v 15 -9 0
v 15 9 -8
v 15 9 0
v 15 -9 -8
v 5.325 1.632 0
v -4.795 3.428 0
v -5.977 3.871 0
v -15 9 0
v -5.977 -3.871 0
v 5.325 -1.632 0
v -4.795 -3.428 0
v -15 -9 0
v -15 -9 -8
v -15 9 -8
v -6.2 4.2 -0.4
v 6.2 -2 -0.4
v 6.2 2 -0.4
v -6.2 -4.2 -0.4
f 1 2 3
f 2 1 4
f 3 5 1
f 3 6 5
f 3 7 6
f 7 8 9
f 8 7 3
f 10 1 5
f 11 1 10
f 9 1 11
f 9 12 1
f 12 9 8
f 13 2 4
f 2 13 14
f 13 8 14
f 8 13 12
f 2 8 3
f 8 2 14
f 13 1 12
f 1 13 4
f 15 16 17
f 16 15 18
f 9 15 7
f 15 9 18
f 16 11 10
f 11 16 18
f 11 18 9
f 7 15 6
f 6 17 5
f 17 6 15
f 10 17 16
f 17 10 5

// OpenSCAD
// file: faceted_ridge_key.scad
// Faceted ridge key — asymmetric male/female alignment feature, flat facets only.
//
// 6 vertices, 7 faces, one closed manifold. Euler check: V - E + F = 6 - 11 + 7 = 2.
// No spheres, no cylinders, no splines, no fillets.
//
// THE FLANKS ARE TRIANGULATED EXPLICITLY, and that is not cosmetic. Written as quads
// [0,3,5,4] and [1,4,5,2] they are NOT planar — the base edge and the ridge edge are
// skew, so the four corners do not share a plane. A checker caught this after the first
// draft claimed the opposite. Left as quads, the tessellator picks the fold direction for
// you, which means the "flat facet" promise is broken by an unspecified crease and two
// exporters can disagree about the shape. Splitting them here fixes the crease at
// back-bottom -> front-ridge, which keeps the rear peak's triangle large and clean.
//
// FRAME CONVENTION (matches the CAD mate connector it is derived from):
//   +Z  the mating axis   — the feature protrudes along it
//   +X  the roll reference — the ridge runs along it, low end forward
//   +Y  completes the right-handed frame
//
// WHAT BREAKS WHICH SYMMETRY
//   rotational about Z ....... the ridge (elongation along X)
//   180 deg about Z .......... the ridge SLOPE: tall steep back, long shallow front
//   mirror across XZ ......... deliberately NOT broken. Handedness is fixed by convention,
//                              so +Y is implied once Z and X are known. Breaking it would
//                              add a facet and buy nothing.
//
// KNOWN AMBIGUITY, stated rather than hidden: viewed exactly ALONG the ridge (+/-X,
// orthographic), the silhouette is the same isoceles triangle from front and back. Front
// and back are then distinguished by SHADING only — the long shallow front face catches
// light differently from the steep back face. If the target renderer is flat-shaded with a
// single headlight, verify this case before committing to the shape.

// ---------------------------------------------------------------- parameters
L   = 12.0;   // overall length along the ridge (X)
W   = 4.0;    // half-width at the BACK
tf  = 0.45;   // front taper: front half-width = W * tf
H   = 4.5;    // peak height at the rear   <-- the single dimension controlling asymmetry
pr  = 0.22;   // rear ridge position, fraction of L from the back
pf  = 0.62;   // front ridge position, fraction of L from the back
hf  = 0.35;   // front ridge height, fraction of H

// Clearance is a PHYSICAL quantity and only means anything if this is a printed part.
// See the note at the bottom: for a viewport glyph it is meaningless.
clr    = 0.20;  // per-face clearance, mm
depth  = 0.40;  // extra pocket depth so the male never bottoms out before it seats

Wf  = W * tf;
xr0 = -L/2 + L * pr;
xr1 = -L/2 + L * pf;
Hf  = H * hf;

// ---------------------------------------------------------------- geometry
// Vertex order is fixed and referenced by the face table; do not reorder.
//   0 back-left    1 back-right    2 front-right    3 front-left
//   4 REAR PEAK (tall)             5 front ridge (low)
function ridge_pts(l, w, wf, h, hfr, x0, x1) = [
    [-l/2, -w,   0  ],   // 0
    [-l/2,  w,   0  ],   // 1
    [ l/2,  wf,  0  ],   // 2
    [ l/2, -wf,  0  ],   // 3
    [ x0,   0,   h  ],   // 4  rear peak
    [ x1,   0,   hfr]    // 5  front ridge, low
];

// OpenSCAD wants each face wound CLOCKWISE seen from OUTSIDE. The right-hand-rule
// outward-normal (CCW) form is given in the comment for anyone porting to STL/OCC,
// where the opposite convention is the usual one.
RIDGE_FACES = [
    [3, 2, 1, 0],   // base       (CCW-outward: [0,1,2,3])   planar, all z=0
    [1, 4, 0],      // back       (CCW-outward: [0,4,1])     steep
    [5, 3, 0],      // flank -Y a (CCW-outward: [0,3,5])
    [4, 5, 0],      // flank -Y b (CCW-outward: [0,5,4])
    [5, 4, 1],      // flank +Y a (CCW-outward: [1,4,5])
    [2, 5, 1],      // flank +Y b (CCW-outward: [1,5,2])
    [5, 2, 3]       // front      (CCW-outward: [3,2,5])     long, shallow
];

module ridge_key(l = L, w = W, wf = Wf, h = H, hfr = Hf, x0 = xr0, x1 = xr1) {
    polyhedron(points = ridge_pts(l, w, wf, h, hfr, x0, x1),
               faces  = RIDGE_FACES,
               convexity = 3);
}

// MALE: the protrusion, nominal size.
module ridge_key_male() { ridge_key(); }

// FEMALE: the pocket. Grown by `clr` on every side and sunk `depth` deeper.
//
// HONEST LIMITATION: this grows the key by scaling its defining dimensions, which is NOT a
// true uniform surface offset — on the shallow front face the normal clearance comes out
// smaller than `clr`, because that face is far from perpendicular to every axis it is
// scaled along. A true offset needs minkowski() with a small cube, which is exact and slow,
// or an explicit per-face plane push, which is exact and fiddly. For a keying feature whose
// job is angular registration rather than a press fit, the approximation is the right trade
// — but do not quote this pocket as holding 0.2 mm everywhere, because it does not.
module ridge_key_female() {
    translate([0, 0, -depth])
        ridge_key(l   = L + 2*clr,
                  w   = W + clr,
                  wf  = Wf + clr,
                  h   = H + clr + depth,
                  hfr = Hf + clr + depth,
                  x0  = xr0,
                  x1  = xr1);
}

// ---------------------------------------------------------------- demo
// Left: the male key on its plate. Right: the plate with the pocket cut.
PLATE = [30, 18, 3];

module plate_with_male() {
    translate([-PLATE[0]/2, -PLATE[1]/2, -PLATE[2]]) cube(PLATE);
    ridge_key_male();
}

module plate_with_female() {
    difference() {
        translate([-PLATE[0]/2, -PLATE[1]/2, -PLATE[2]]) cube(PLATE);
        ridge_key_female();
    }
}

translate([-20, 0, 0]) plate_with_male();
translate([ 20, 0, 0]) plate_with_female();

// ---------------------------------------------------------------- note on the two readings
// This file is written for the PHYSICAL reading: a printable alignment key, where `clr` and
// `depth` are real millimetres and flat facets genuinely help — they slice without the
// stair-stepping a tessellated curve produces, and they print without support on the
// shallow front face.
//
// If the intent is instead the VIEWPORT GLYPH for a CAD mate connector, then:
//   - `clr` and `depth` are meaningless: a symbol does not mate with anything;
//   - all dimensions must become SCREEN PIXELS scaled by upp = 1/zoom, because every gizmo
//     in that viewport is screen-constant and must not shrink with the model;
//   - "low-poly for rendering performance" is not a real reason at ~2-20 glyphs per frame.
//     The real reason to keep flat facets there is LEGIBILITY: hard normals give distinct
//     value steps between facets, and that is what lets a 22-px solid read as an oriented
//     object instead of a grey blob.
// The vertex logic above is identical under both readings. Only the units and the clearance
// change.
// main file
// Female half alone, for the legibility test: is a recessed faceted pocket readable in a
// shaded view, or does a concave feature just read as a dark hole with no orientation?
use <faceted_ridge_key.scad>

// The plate must be THICKER than the key is tall, or the "pocket" is a through-hole. The
// first version used 3 mm against a 4.5 mm key and cut straight through — caught only by
// rendering it. Minimum stock = H + clearance + pocket depth + a wall to print against.
PLATE = [30, 18, 8];
difference() {
    translate([-PLATE[0]/2, -PLATE[1]/2, -PLATE[2]]) cube(PLATE);
    ridge_key_female();
}
